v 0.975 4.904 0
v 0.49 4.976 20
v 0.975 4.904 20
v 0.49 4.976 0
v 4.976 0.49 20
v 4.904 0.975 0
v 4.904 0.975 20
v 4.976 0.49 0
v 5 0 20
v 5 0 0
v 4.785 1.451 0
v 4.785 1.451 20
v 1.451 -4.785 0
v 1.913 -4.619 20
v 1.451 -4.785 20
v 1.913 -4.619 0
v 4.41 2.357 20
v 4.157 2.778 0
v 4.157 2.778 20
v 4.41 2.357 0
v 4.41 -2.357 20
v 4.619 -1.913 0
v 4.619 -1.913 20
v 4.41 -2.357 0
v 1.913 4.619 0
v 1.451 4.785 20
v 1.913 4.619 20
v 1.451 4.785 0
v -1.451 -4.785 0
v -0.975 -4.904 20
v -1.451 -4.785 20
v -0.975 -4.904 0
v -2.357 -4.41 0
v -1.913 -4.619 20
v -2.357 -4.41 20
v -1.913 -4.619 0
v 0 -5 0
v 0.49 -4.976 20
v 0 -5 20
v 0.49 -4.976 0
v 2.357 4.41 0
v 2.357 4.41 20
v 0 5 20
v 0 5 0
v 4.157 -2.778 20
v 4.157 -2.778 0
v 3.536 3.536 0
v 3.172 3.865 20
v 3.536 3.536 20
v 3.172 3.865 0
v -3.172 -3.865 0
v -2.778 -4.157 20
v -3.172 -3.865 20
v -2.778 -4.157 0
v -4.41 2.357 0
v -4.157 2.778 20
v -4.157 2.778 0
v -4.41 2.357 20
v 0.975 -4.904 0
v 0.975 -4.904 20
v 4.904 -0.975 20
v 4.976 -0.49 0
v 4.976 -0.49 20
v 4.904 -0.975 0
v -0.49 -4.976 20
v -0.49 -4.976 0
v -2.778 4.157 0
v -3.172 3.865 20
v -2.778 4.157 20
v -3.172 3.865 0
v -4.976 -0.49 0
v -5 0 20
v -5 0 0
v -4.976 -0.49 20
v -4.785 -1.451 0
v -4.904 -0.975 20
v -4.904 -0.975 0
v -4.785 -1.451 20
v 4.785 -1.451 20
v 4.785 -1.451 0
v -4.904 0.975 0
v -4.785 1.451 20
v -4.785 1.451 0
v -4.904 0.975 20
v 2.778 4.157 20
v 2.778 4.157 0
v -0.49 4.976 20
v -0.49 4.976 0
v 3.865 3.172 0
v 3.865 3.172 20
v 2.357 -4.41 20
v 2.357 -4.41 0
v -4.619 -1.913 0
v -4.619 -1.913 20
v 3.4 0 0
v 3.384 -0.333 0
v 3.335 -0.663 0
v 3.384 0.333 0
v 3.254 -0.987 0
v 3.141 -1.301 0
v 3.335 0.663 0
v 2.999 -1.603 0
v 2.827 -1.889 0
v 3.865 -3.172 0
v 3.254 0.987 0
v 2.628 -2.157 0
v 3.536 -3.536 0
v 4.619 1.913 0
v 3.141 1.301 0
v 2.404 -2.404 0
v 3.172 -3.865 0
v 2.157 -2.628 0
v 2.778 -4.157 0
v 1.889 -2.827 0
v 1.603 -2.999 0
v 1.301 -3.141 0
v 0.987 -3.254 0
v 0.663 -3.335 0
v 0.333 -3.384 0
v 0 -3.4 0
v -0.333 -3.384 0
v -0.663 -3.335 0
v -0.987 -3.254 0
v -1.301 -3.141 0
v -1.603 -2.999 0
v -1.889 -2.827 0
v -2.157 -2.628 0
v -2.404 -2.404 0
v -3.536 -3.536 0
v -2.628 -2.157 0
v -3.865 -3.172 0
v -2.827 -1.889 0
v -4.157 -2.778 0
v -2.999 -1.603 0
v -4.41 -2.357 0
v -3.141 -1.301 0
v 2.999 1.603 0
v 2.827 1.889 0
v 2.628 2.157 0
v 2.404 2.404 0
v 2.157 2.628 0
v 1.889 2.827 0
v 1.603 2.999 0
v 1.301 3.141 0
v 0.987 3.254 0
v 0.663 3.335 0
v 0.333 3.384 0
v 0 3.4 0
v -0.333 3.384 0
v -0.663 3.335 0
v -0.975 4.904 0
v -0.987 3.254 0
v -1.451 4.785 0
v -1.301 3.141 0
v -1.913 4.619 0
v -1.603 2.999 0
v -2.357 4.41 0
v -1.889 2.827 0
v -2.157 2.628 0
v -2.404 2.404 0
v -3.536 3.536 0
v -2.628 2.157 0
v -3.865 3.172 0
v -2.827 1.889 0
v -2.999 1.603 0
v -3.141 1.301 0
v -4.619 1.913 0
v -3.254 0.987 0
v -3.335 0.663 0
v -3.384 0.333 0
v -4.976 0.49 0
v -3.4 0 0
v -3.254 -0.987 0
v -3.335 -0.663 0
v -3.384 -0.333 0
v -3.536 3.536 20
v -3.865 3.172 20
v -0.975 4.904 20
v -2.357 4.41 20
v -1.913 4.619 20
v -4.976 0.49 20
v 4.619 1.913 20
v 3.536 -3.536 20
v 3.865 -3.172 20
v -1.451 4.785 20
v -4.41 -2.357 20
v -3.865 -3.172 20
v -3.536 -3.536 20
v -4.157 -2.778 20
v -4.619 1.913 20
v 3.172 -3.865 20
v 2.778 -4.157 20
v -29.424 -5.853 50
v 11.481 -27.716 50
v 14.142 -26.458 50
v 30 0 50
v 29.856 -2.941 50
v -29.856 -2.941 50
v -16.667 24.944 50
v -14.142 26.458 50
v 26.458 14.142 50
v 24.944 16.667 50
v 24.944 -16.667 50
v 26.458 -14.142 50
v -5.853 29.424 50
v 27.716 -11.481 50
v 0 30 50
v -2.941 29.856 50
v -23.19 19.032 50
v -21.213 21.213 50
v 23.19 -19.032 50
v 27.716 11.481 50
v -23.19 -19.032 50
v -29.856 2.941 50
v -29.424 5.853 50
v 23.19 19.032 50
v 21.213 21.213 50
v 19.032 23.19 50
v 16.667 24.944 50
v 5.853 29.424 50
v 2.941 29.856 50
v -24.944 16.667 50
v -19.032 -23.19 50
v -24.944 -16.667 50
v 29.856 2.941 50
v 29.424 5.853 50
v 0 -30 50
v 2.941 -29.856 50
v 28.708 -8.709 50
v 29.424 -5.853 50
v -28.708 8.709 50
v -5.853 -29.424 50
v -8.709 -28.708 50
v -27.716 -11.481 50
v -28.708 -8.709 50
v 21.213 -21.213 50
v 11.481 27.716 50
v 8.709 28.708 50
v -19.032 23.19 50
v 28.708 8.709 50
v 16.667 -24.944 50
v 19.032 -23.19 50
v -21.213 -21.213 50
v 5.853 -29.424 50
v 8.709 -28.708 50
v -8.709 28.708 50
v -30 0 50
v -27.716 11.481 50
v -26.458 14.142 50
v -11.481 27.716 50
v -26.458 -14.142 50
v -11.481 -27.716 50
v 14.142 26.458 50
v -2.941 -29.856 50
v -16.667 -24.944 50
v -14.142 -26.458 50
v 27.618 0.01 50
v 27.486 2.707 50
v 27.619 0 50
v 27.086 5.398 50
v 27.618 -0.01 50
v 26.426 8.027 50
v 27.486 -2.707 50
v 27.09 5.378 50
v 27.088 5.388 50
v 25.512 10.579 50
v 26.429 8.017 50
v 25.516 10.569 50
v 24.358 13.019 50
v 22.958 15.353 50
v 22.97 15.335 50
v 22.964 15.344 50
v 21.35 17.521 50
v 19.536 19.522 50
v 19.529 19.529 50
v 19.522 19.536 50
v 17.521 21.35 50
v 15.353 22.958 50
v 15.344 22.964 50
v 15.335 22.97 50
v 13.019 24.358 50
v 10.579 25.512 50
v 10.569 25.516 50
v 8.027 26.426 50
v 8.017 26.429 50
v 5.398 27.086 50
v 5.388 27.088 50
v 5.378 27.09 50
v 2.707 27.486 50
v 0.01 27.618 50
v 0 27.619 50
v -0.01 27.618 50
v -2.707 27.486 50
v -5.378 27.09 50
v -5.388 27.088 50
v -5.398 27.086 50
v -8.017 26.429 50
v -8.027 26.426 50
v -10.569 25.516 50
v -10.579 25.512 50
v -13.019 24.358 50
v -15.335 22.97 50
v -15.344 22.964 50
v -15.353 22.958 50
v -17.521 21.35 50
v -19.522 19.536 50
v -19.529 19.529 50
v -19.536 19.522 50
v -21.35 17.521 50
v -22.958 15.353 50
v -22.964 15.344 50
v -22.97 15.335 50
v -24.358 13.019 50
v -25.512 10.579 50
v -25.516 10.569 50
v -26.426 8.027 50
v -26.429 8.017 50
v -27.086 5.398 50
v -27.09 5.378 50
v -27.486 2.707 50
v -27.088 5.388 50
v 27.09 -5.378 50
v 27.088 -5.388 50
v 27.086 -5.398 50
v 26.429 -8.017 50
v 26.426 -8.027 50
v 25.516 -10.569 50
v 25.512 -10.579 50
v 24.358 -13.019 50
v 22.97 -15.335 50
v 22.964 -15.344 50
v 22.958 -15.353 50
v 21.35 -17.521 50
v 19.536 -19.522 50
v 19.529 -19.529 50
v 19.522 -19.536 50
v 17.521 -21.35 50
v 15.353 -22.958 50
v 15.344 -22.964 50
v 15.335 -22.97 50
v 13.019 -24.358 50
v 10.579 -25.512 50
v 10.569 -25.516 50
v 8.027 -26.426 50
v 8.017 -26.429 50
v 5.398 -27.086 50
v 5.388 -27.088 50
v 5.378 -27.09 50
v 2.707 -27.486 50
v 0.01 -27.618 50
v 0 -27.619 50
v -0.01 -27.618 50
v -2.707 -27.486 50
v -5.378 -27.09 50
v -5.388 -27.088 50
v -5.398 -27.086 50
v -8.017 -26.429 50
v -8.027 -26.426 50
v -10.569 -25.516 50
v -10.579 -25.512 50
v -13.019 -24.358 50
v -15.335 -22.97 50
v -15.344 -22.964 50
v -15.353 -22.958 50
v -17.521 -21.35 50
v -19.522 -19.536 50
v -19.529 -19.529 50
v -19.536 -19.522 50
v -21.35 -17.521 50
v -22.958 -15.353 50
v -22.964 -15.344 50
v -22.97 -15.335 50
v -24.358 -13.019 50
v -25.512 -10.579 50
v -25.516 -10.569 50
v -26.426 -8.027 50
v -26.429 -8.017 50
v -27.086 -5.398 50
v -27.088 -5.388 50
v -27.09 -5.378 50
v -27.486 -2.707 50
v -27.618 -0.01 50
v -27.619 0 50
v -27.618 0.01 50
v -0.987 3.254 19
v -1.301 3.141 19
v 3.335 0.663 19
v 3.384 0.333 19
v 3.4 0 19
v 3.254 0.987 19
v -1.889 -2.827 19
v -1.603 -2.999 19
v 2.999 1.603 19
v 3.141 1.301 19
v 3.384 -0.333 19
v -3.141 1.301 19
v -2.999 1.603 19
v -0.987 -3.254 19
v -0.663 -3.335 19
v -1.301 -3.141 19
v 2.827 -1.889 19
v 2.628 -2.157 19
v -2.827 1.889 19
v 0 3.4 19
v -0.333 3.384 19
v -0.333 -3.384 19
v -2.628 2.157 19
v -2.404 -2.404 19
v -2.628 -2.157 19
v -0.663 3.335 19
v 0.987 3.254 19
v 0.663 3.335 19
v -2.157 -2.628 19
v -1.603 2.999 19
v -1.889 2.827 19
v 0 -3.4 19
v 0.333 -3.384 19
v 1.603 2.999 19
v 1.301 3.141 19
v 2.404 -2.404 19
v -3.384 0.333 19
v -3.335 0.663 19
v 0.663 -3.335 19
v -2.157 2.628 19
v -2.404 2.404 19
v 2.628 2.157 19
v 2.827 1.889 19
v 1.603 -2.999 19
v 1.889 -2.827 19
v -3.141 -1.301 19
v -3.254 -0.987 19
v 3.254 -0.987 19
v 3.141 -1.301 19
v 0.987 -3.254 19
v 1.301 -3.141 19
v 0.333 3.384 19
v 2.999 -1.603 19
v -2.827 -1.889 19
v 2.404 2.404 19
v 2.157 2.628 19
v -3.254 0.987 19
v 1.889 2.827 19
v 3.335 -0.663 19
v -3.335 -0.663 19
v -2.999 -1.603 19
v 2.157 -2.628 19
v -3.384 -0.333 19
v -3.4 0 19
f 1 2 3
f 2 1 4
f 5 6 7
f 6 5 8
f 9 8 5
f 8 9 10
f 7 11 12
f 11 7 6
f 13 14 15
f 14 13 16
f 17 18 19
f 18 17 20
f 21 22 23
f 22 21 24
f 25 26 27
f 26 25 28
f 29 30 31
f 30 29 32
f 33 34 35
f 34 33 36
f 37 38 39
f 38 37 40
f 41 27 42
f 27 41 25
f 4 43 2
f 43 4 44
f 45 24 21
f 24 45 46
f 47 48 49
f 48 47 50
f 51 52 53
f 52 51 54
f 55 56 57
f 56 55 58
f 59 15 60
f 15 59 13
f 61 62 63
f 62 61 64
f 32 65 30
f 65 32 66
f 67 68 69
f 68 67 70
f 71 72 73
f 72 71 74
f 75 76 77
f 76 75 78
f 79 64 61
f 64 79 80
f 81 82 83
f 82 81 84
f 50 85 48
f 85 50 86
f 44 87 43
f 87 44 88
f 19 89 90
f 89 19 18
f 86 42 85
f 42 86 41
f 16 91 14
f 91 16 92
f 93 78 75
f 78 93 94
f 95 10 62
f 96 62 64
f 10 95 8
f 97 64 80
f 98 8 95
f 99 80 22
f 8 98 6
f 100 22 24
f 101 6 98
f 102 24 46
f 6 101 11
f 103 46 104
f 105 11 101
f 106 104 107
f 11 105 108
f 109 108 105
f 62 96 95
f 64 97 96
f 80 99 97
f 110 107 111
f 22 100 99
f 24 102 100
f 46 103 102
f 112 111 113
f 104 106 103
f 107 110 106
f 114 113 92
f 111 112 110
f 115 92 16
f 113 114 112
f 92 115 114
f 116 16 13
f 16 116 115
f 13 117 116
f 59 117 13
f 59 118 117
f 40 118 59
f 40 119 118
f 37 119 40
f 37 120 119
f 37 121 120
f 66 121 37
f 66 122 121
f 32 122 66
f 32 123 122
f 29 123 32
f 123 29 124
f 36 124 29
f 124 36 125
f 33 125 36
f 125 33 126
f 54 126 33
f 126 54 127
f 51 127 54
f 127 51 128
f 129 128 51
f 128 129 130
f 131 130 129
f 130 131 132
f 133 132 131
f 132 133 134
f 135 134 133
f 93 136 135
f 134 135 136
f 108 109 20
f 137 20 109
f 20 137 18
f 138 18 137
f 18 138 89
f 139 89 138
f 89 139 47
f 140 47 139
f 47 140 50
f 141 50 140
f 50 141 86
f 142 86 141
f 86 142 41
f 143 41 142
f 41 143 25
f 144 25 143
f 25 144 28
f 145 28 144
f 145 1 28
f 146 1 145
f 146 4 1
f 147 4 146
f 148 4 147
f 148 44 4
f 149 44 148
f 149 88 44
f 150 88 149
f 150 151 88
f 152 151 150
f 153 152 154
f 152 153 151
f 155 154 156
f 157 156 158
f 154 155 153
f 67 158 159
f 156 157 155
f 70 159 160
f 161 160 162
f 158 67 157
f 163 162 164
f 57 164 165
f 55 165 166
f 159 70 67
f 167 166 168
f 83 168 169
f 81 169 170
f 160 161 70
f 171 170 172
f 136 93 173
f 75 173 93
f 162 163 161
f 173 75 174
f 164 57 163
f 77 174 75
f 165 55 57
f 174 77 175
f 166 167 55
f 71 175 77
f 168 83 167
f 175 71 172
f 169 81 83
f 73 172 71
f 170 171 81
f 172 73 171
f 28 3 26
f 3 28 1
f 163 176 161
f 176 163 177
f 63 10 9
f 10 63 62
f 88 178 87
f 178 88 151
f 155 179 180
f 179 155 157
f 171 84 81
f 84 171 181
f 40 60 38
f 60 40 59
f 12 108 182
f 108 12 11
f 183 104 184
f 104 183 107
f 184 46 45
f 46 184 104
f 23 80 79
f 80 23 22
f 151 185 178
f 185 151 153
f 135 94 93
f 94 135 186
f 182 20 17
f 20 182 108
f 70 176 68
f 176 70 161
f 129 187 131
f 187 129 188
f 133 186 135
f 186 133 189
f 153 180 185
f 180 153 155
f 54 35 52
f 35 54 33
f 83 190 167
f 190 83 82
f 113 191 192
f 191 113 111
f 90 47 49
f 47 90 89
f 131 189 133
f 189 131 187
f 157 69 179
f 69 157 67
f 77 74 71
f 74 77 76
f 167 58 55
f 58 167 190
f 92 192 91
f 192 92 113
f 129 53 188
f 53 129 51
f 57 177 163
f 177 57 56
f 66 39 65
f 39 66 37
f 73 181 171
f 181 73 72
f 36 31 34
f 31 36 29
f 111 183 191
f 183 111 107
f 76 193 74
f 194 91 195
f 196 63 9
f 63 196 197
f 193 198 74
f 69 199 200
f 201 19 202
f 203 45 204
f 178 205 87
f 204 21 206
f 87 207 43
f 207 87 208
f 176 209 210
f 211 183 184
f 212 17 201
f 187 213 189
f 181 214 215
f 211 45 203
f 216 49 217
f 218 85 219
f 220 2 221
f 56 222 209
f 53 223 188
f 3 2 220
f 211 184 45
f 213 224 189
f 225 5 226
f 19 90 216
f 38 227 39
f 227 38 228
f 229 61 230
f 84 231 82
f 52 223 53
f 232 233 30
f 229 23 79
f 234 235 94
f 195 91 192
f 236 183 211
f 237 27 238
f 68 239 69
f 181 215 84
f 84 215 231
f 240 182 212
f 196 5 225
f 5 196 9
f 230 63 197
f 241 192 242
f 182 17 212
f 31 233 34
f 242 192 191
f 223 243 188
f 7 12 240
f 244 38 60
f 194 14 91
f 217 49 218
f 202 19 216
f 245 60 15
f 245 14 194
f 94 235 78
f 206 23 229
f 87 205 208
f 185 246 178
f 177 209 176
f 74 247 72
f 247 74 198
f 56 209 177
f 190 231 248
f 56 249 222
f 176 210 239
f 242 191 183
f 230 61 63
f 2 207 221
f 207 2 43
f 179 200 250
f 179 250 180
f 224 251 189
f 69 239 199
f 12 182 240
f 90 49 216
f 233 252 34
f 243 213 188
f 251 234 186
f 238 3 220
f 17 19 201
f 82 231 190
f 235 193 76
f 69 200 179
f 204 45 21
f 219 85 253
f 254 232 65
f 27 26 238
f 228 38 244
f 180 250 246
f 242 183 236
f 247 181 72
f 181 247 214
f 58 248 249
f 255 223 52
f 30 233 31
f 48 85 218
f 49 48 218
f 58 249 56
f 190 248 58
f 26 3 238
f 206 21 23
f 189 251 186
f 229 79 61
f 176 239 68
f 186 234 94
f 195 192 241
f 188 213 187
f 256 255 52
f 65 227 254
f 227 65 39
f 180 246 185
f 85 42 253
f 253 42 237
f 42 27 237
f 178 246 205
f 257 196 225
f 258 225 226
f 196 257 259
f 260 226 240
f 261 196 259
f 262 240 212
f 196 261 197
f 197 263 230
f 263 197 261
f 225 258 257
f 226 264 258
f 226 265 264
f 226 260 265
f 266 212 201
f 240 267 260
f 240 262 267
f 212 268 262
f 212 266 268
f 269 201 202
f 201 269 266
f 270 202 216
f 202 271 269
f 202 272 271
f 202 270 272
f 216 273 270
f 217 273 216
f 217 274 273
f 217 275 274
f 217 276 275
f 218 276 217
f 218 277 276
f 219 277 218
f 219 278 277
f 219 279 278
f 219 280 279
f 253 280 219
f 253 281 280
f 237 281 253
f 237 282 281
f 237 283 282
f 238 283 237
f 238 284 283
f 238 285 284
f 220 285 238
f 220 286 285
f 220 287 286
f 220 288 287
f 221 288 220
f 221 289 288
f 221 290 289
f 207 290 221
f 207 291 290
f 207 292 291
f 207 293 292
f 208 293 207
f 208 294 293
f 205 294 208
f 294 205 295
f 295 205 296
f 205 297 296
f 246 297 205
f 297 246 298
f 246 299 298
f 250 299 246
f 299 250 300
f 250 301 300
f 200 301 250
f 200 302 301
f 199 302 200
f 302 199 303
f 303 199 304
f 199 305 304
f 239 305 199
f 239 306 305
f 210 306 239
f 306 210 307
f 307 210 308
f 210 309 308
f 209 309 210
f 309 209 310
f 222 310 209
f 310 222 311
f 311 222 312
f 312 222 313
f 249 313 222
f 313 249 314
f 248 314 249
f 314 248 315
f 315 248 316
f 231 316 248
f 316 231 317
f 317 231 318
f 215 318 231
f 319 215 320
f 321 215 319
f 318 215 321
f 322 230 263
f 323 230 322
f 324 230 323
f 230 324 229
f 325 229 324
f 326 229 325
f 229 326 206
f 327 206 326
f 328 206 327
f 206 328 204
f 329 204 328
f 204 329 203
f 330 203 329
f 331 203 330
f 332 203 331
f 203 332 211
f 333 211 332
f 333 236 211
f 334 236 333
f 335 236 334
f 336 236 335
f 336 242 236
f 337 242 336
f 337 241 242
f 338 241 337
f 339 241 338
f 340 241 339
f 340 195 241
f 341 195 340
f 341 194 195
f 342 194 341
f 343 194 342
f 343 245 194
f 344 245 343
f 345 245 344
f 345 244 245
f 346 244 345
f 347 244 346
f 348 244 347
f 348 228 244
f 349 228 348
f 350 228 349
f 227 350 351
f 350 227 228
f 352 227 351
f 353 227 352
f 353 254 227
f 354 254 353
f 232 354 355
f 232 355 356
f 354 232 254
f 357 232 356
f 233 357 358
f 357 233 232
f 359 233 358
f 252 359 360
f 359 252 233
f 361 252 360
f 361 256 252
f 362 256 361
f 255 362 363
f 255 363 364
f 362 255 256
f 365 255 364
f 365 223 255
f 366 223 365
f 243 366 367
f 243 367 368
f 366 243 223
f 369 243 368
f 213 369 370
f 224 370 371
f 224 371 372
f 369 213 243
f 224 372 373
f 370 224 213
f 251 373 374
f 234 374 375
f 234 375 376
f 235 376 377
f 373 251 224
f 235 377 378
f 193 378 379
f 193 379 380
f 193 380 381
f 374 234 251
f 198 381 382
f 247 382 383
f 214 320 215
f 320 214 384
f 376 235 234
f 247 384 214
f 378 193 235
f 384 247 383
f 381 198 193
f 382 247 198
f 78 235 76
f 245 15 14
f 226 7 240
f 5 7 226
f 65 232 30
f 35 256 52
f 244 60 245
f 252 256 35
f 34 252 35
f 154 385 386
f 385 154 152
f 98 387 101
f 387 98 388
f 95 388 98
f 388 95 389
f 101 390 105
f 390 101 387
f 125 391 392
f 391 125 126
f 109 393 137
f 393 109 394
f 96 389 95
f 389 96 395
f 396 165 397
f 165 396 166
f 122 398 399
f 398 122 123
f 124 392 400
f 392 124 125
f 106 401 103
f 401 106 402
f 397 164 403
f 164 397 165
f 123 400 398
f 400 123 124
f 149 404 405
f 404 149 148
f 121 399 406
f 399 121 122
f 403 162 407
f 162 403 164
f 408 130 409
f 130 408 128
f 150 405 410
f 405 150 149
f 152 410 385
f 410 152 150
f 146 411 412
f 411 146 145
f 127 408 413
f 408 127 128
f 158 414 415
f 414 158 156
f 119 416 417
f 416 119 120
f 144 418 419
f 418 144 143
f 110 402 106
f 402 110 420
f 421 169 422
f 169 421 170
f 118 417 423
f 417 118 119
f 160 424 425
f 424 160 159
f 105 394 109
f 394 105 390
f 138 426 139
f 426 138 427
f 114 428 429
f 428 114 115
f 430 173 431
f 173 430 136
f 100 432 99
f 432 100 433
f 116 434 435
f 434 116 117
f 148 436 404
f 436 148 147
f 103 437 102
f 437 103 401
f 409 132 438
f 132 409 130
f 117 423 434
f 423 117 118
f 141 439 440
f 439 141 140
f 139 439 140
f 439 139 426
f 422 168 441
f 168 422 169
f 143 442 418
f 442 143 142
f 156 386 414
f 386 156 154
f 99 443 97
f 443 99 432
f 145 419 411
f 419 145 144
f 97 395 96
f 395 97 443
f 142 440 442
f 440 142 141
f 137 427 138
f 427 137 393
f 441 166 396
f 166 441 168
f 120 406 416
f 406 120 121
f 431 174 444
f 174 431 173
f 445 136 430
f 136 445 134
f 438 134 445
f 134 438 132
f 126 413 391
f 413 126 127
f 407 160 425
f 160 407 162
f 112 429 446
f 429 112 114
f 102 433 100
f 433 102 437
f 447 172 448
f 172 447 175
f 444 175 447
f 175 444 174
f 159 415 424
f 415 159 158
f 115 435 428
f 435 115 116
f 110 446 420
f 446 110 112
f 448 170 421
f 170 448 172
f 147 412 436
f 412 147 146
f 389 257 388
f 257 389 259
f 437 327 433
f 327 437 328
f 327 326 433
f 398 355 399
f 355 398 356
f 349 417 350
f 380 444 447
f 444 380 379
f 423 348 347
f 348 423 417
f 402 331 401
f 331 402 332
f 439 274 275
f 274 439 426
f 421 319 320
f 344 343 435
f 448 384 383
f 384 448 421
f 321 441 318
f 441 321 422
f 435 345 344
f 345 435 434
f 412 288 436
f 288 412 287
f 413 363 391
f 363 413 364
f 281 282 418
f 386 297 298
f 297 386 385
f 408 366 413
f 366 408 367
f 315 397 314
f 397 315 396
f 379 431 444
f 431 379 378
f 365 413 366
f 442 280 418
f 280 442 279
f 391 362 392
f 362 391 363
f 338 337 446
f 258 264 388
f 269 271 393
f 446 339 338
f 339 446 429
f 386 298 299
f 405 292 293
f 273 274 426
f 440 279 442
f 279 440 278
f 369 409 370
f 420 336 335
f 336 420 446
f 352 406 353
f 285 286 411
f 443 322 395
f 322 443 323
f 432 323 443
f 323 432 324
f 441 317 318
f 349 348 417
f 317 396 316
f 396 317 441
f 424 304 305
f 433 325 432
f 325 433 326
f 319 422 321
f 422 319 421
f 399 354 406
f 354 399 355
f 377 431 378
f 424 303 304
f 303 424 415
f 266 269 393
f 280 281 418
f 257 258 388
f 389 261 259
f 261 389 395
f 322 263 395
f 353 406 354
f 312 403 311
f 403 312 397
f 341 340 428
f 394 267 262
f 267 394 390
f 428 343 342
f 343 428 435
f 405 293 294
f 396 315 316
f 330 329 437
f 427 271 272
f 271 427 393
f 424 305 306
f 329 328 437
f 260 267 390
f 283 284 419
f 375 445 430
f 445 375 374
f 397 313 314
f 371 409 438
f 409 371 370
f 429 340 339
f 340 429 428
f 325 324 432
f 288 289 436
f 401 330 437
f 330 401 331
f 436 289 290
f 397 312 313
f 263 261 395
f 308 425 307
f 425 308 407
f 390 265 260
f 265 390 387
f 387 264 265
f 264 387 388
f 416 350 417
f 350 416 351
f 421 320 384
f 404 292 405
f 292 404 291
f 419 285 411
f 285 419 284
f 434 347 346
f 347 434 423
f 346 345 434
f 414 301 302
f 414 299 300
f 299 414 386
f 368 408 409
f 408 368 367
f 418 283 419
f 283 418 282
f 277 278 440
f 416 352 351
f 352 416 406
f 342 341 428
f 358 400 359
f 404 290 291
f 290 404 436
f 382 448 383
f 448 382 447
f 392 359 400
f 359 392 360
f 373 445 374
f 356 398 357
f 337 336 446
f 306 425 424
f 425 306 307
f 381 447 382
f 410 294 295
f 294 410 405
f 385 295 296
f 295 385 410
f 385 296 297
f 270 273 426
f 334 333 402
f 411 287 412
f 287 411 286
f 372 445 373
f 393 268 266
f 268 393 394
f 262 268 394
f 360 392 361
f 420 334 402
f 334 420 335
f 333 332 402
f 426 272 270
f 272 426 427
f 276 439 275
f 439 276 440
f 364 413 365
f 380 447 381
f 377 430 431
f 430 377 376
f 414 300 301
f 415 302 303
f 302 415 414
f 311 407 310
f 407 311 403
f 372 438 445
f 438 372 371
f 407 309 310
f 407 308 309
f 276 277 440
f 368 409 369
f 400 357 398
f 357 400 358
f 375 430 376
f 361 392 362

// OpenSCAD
// Funnel - a straight spout (tube) with a conical bowl, open at both ends, for pouring
// liquids in the lab. NOVEL general part.
//

spout_d = 10;
spout_l = 20;
cone_d  = 60;
rim     = 50;
wall    = 1.6;

$fn = 64;

ib = spout_d - 2 * wall;   // bore of the spout

difference() {
    union() {
        cylinder(h = spout_l, d = spout_d);          // spout
        translate([0, 0, spout_l]) cylinder(h = 30, d1 = spout_d, d2 = cone_d);  // cone (open top)
    }
    translate([0, 0, -1]) cylinder(h = spout_l + 2, d = ib);   // bore through the spout
    translate([0, 0, spout_l - 1]) cylinder(h = 32, d1 = ib, d2 = cone_d - 2 * wall);  // clear the bore into the cone
}
